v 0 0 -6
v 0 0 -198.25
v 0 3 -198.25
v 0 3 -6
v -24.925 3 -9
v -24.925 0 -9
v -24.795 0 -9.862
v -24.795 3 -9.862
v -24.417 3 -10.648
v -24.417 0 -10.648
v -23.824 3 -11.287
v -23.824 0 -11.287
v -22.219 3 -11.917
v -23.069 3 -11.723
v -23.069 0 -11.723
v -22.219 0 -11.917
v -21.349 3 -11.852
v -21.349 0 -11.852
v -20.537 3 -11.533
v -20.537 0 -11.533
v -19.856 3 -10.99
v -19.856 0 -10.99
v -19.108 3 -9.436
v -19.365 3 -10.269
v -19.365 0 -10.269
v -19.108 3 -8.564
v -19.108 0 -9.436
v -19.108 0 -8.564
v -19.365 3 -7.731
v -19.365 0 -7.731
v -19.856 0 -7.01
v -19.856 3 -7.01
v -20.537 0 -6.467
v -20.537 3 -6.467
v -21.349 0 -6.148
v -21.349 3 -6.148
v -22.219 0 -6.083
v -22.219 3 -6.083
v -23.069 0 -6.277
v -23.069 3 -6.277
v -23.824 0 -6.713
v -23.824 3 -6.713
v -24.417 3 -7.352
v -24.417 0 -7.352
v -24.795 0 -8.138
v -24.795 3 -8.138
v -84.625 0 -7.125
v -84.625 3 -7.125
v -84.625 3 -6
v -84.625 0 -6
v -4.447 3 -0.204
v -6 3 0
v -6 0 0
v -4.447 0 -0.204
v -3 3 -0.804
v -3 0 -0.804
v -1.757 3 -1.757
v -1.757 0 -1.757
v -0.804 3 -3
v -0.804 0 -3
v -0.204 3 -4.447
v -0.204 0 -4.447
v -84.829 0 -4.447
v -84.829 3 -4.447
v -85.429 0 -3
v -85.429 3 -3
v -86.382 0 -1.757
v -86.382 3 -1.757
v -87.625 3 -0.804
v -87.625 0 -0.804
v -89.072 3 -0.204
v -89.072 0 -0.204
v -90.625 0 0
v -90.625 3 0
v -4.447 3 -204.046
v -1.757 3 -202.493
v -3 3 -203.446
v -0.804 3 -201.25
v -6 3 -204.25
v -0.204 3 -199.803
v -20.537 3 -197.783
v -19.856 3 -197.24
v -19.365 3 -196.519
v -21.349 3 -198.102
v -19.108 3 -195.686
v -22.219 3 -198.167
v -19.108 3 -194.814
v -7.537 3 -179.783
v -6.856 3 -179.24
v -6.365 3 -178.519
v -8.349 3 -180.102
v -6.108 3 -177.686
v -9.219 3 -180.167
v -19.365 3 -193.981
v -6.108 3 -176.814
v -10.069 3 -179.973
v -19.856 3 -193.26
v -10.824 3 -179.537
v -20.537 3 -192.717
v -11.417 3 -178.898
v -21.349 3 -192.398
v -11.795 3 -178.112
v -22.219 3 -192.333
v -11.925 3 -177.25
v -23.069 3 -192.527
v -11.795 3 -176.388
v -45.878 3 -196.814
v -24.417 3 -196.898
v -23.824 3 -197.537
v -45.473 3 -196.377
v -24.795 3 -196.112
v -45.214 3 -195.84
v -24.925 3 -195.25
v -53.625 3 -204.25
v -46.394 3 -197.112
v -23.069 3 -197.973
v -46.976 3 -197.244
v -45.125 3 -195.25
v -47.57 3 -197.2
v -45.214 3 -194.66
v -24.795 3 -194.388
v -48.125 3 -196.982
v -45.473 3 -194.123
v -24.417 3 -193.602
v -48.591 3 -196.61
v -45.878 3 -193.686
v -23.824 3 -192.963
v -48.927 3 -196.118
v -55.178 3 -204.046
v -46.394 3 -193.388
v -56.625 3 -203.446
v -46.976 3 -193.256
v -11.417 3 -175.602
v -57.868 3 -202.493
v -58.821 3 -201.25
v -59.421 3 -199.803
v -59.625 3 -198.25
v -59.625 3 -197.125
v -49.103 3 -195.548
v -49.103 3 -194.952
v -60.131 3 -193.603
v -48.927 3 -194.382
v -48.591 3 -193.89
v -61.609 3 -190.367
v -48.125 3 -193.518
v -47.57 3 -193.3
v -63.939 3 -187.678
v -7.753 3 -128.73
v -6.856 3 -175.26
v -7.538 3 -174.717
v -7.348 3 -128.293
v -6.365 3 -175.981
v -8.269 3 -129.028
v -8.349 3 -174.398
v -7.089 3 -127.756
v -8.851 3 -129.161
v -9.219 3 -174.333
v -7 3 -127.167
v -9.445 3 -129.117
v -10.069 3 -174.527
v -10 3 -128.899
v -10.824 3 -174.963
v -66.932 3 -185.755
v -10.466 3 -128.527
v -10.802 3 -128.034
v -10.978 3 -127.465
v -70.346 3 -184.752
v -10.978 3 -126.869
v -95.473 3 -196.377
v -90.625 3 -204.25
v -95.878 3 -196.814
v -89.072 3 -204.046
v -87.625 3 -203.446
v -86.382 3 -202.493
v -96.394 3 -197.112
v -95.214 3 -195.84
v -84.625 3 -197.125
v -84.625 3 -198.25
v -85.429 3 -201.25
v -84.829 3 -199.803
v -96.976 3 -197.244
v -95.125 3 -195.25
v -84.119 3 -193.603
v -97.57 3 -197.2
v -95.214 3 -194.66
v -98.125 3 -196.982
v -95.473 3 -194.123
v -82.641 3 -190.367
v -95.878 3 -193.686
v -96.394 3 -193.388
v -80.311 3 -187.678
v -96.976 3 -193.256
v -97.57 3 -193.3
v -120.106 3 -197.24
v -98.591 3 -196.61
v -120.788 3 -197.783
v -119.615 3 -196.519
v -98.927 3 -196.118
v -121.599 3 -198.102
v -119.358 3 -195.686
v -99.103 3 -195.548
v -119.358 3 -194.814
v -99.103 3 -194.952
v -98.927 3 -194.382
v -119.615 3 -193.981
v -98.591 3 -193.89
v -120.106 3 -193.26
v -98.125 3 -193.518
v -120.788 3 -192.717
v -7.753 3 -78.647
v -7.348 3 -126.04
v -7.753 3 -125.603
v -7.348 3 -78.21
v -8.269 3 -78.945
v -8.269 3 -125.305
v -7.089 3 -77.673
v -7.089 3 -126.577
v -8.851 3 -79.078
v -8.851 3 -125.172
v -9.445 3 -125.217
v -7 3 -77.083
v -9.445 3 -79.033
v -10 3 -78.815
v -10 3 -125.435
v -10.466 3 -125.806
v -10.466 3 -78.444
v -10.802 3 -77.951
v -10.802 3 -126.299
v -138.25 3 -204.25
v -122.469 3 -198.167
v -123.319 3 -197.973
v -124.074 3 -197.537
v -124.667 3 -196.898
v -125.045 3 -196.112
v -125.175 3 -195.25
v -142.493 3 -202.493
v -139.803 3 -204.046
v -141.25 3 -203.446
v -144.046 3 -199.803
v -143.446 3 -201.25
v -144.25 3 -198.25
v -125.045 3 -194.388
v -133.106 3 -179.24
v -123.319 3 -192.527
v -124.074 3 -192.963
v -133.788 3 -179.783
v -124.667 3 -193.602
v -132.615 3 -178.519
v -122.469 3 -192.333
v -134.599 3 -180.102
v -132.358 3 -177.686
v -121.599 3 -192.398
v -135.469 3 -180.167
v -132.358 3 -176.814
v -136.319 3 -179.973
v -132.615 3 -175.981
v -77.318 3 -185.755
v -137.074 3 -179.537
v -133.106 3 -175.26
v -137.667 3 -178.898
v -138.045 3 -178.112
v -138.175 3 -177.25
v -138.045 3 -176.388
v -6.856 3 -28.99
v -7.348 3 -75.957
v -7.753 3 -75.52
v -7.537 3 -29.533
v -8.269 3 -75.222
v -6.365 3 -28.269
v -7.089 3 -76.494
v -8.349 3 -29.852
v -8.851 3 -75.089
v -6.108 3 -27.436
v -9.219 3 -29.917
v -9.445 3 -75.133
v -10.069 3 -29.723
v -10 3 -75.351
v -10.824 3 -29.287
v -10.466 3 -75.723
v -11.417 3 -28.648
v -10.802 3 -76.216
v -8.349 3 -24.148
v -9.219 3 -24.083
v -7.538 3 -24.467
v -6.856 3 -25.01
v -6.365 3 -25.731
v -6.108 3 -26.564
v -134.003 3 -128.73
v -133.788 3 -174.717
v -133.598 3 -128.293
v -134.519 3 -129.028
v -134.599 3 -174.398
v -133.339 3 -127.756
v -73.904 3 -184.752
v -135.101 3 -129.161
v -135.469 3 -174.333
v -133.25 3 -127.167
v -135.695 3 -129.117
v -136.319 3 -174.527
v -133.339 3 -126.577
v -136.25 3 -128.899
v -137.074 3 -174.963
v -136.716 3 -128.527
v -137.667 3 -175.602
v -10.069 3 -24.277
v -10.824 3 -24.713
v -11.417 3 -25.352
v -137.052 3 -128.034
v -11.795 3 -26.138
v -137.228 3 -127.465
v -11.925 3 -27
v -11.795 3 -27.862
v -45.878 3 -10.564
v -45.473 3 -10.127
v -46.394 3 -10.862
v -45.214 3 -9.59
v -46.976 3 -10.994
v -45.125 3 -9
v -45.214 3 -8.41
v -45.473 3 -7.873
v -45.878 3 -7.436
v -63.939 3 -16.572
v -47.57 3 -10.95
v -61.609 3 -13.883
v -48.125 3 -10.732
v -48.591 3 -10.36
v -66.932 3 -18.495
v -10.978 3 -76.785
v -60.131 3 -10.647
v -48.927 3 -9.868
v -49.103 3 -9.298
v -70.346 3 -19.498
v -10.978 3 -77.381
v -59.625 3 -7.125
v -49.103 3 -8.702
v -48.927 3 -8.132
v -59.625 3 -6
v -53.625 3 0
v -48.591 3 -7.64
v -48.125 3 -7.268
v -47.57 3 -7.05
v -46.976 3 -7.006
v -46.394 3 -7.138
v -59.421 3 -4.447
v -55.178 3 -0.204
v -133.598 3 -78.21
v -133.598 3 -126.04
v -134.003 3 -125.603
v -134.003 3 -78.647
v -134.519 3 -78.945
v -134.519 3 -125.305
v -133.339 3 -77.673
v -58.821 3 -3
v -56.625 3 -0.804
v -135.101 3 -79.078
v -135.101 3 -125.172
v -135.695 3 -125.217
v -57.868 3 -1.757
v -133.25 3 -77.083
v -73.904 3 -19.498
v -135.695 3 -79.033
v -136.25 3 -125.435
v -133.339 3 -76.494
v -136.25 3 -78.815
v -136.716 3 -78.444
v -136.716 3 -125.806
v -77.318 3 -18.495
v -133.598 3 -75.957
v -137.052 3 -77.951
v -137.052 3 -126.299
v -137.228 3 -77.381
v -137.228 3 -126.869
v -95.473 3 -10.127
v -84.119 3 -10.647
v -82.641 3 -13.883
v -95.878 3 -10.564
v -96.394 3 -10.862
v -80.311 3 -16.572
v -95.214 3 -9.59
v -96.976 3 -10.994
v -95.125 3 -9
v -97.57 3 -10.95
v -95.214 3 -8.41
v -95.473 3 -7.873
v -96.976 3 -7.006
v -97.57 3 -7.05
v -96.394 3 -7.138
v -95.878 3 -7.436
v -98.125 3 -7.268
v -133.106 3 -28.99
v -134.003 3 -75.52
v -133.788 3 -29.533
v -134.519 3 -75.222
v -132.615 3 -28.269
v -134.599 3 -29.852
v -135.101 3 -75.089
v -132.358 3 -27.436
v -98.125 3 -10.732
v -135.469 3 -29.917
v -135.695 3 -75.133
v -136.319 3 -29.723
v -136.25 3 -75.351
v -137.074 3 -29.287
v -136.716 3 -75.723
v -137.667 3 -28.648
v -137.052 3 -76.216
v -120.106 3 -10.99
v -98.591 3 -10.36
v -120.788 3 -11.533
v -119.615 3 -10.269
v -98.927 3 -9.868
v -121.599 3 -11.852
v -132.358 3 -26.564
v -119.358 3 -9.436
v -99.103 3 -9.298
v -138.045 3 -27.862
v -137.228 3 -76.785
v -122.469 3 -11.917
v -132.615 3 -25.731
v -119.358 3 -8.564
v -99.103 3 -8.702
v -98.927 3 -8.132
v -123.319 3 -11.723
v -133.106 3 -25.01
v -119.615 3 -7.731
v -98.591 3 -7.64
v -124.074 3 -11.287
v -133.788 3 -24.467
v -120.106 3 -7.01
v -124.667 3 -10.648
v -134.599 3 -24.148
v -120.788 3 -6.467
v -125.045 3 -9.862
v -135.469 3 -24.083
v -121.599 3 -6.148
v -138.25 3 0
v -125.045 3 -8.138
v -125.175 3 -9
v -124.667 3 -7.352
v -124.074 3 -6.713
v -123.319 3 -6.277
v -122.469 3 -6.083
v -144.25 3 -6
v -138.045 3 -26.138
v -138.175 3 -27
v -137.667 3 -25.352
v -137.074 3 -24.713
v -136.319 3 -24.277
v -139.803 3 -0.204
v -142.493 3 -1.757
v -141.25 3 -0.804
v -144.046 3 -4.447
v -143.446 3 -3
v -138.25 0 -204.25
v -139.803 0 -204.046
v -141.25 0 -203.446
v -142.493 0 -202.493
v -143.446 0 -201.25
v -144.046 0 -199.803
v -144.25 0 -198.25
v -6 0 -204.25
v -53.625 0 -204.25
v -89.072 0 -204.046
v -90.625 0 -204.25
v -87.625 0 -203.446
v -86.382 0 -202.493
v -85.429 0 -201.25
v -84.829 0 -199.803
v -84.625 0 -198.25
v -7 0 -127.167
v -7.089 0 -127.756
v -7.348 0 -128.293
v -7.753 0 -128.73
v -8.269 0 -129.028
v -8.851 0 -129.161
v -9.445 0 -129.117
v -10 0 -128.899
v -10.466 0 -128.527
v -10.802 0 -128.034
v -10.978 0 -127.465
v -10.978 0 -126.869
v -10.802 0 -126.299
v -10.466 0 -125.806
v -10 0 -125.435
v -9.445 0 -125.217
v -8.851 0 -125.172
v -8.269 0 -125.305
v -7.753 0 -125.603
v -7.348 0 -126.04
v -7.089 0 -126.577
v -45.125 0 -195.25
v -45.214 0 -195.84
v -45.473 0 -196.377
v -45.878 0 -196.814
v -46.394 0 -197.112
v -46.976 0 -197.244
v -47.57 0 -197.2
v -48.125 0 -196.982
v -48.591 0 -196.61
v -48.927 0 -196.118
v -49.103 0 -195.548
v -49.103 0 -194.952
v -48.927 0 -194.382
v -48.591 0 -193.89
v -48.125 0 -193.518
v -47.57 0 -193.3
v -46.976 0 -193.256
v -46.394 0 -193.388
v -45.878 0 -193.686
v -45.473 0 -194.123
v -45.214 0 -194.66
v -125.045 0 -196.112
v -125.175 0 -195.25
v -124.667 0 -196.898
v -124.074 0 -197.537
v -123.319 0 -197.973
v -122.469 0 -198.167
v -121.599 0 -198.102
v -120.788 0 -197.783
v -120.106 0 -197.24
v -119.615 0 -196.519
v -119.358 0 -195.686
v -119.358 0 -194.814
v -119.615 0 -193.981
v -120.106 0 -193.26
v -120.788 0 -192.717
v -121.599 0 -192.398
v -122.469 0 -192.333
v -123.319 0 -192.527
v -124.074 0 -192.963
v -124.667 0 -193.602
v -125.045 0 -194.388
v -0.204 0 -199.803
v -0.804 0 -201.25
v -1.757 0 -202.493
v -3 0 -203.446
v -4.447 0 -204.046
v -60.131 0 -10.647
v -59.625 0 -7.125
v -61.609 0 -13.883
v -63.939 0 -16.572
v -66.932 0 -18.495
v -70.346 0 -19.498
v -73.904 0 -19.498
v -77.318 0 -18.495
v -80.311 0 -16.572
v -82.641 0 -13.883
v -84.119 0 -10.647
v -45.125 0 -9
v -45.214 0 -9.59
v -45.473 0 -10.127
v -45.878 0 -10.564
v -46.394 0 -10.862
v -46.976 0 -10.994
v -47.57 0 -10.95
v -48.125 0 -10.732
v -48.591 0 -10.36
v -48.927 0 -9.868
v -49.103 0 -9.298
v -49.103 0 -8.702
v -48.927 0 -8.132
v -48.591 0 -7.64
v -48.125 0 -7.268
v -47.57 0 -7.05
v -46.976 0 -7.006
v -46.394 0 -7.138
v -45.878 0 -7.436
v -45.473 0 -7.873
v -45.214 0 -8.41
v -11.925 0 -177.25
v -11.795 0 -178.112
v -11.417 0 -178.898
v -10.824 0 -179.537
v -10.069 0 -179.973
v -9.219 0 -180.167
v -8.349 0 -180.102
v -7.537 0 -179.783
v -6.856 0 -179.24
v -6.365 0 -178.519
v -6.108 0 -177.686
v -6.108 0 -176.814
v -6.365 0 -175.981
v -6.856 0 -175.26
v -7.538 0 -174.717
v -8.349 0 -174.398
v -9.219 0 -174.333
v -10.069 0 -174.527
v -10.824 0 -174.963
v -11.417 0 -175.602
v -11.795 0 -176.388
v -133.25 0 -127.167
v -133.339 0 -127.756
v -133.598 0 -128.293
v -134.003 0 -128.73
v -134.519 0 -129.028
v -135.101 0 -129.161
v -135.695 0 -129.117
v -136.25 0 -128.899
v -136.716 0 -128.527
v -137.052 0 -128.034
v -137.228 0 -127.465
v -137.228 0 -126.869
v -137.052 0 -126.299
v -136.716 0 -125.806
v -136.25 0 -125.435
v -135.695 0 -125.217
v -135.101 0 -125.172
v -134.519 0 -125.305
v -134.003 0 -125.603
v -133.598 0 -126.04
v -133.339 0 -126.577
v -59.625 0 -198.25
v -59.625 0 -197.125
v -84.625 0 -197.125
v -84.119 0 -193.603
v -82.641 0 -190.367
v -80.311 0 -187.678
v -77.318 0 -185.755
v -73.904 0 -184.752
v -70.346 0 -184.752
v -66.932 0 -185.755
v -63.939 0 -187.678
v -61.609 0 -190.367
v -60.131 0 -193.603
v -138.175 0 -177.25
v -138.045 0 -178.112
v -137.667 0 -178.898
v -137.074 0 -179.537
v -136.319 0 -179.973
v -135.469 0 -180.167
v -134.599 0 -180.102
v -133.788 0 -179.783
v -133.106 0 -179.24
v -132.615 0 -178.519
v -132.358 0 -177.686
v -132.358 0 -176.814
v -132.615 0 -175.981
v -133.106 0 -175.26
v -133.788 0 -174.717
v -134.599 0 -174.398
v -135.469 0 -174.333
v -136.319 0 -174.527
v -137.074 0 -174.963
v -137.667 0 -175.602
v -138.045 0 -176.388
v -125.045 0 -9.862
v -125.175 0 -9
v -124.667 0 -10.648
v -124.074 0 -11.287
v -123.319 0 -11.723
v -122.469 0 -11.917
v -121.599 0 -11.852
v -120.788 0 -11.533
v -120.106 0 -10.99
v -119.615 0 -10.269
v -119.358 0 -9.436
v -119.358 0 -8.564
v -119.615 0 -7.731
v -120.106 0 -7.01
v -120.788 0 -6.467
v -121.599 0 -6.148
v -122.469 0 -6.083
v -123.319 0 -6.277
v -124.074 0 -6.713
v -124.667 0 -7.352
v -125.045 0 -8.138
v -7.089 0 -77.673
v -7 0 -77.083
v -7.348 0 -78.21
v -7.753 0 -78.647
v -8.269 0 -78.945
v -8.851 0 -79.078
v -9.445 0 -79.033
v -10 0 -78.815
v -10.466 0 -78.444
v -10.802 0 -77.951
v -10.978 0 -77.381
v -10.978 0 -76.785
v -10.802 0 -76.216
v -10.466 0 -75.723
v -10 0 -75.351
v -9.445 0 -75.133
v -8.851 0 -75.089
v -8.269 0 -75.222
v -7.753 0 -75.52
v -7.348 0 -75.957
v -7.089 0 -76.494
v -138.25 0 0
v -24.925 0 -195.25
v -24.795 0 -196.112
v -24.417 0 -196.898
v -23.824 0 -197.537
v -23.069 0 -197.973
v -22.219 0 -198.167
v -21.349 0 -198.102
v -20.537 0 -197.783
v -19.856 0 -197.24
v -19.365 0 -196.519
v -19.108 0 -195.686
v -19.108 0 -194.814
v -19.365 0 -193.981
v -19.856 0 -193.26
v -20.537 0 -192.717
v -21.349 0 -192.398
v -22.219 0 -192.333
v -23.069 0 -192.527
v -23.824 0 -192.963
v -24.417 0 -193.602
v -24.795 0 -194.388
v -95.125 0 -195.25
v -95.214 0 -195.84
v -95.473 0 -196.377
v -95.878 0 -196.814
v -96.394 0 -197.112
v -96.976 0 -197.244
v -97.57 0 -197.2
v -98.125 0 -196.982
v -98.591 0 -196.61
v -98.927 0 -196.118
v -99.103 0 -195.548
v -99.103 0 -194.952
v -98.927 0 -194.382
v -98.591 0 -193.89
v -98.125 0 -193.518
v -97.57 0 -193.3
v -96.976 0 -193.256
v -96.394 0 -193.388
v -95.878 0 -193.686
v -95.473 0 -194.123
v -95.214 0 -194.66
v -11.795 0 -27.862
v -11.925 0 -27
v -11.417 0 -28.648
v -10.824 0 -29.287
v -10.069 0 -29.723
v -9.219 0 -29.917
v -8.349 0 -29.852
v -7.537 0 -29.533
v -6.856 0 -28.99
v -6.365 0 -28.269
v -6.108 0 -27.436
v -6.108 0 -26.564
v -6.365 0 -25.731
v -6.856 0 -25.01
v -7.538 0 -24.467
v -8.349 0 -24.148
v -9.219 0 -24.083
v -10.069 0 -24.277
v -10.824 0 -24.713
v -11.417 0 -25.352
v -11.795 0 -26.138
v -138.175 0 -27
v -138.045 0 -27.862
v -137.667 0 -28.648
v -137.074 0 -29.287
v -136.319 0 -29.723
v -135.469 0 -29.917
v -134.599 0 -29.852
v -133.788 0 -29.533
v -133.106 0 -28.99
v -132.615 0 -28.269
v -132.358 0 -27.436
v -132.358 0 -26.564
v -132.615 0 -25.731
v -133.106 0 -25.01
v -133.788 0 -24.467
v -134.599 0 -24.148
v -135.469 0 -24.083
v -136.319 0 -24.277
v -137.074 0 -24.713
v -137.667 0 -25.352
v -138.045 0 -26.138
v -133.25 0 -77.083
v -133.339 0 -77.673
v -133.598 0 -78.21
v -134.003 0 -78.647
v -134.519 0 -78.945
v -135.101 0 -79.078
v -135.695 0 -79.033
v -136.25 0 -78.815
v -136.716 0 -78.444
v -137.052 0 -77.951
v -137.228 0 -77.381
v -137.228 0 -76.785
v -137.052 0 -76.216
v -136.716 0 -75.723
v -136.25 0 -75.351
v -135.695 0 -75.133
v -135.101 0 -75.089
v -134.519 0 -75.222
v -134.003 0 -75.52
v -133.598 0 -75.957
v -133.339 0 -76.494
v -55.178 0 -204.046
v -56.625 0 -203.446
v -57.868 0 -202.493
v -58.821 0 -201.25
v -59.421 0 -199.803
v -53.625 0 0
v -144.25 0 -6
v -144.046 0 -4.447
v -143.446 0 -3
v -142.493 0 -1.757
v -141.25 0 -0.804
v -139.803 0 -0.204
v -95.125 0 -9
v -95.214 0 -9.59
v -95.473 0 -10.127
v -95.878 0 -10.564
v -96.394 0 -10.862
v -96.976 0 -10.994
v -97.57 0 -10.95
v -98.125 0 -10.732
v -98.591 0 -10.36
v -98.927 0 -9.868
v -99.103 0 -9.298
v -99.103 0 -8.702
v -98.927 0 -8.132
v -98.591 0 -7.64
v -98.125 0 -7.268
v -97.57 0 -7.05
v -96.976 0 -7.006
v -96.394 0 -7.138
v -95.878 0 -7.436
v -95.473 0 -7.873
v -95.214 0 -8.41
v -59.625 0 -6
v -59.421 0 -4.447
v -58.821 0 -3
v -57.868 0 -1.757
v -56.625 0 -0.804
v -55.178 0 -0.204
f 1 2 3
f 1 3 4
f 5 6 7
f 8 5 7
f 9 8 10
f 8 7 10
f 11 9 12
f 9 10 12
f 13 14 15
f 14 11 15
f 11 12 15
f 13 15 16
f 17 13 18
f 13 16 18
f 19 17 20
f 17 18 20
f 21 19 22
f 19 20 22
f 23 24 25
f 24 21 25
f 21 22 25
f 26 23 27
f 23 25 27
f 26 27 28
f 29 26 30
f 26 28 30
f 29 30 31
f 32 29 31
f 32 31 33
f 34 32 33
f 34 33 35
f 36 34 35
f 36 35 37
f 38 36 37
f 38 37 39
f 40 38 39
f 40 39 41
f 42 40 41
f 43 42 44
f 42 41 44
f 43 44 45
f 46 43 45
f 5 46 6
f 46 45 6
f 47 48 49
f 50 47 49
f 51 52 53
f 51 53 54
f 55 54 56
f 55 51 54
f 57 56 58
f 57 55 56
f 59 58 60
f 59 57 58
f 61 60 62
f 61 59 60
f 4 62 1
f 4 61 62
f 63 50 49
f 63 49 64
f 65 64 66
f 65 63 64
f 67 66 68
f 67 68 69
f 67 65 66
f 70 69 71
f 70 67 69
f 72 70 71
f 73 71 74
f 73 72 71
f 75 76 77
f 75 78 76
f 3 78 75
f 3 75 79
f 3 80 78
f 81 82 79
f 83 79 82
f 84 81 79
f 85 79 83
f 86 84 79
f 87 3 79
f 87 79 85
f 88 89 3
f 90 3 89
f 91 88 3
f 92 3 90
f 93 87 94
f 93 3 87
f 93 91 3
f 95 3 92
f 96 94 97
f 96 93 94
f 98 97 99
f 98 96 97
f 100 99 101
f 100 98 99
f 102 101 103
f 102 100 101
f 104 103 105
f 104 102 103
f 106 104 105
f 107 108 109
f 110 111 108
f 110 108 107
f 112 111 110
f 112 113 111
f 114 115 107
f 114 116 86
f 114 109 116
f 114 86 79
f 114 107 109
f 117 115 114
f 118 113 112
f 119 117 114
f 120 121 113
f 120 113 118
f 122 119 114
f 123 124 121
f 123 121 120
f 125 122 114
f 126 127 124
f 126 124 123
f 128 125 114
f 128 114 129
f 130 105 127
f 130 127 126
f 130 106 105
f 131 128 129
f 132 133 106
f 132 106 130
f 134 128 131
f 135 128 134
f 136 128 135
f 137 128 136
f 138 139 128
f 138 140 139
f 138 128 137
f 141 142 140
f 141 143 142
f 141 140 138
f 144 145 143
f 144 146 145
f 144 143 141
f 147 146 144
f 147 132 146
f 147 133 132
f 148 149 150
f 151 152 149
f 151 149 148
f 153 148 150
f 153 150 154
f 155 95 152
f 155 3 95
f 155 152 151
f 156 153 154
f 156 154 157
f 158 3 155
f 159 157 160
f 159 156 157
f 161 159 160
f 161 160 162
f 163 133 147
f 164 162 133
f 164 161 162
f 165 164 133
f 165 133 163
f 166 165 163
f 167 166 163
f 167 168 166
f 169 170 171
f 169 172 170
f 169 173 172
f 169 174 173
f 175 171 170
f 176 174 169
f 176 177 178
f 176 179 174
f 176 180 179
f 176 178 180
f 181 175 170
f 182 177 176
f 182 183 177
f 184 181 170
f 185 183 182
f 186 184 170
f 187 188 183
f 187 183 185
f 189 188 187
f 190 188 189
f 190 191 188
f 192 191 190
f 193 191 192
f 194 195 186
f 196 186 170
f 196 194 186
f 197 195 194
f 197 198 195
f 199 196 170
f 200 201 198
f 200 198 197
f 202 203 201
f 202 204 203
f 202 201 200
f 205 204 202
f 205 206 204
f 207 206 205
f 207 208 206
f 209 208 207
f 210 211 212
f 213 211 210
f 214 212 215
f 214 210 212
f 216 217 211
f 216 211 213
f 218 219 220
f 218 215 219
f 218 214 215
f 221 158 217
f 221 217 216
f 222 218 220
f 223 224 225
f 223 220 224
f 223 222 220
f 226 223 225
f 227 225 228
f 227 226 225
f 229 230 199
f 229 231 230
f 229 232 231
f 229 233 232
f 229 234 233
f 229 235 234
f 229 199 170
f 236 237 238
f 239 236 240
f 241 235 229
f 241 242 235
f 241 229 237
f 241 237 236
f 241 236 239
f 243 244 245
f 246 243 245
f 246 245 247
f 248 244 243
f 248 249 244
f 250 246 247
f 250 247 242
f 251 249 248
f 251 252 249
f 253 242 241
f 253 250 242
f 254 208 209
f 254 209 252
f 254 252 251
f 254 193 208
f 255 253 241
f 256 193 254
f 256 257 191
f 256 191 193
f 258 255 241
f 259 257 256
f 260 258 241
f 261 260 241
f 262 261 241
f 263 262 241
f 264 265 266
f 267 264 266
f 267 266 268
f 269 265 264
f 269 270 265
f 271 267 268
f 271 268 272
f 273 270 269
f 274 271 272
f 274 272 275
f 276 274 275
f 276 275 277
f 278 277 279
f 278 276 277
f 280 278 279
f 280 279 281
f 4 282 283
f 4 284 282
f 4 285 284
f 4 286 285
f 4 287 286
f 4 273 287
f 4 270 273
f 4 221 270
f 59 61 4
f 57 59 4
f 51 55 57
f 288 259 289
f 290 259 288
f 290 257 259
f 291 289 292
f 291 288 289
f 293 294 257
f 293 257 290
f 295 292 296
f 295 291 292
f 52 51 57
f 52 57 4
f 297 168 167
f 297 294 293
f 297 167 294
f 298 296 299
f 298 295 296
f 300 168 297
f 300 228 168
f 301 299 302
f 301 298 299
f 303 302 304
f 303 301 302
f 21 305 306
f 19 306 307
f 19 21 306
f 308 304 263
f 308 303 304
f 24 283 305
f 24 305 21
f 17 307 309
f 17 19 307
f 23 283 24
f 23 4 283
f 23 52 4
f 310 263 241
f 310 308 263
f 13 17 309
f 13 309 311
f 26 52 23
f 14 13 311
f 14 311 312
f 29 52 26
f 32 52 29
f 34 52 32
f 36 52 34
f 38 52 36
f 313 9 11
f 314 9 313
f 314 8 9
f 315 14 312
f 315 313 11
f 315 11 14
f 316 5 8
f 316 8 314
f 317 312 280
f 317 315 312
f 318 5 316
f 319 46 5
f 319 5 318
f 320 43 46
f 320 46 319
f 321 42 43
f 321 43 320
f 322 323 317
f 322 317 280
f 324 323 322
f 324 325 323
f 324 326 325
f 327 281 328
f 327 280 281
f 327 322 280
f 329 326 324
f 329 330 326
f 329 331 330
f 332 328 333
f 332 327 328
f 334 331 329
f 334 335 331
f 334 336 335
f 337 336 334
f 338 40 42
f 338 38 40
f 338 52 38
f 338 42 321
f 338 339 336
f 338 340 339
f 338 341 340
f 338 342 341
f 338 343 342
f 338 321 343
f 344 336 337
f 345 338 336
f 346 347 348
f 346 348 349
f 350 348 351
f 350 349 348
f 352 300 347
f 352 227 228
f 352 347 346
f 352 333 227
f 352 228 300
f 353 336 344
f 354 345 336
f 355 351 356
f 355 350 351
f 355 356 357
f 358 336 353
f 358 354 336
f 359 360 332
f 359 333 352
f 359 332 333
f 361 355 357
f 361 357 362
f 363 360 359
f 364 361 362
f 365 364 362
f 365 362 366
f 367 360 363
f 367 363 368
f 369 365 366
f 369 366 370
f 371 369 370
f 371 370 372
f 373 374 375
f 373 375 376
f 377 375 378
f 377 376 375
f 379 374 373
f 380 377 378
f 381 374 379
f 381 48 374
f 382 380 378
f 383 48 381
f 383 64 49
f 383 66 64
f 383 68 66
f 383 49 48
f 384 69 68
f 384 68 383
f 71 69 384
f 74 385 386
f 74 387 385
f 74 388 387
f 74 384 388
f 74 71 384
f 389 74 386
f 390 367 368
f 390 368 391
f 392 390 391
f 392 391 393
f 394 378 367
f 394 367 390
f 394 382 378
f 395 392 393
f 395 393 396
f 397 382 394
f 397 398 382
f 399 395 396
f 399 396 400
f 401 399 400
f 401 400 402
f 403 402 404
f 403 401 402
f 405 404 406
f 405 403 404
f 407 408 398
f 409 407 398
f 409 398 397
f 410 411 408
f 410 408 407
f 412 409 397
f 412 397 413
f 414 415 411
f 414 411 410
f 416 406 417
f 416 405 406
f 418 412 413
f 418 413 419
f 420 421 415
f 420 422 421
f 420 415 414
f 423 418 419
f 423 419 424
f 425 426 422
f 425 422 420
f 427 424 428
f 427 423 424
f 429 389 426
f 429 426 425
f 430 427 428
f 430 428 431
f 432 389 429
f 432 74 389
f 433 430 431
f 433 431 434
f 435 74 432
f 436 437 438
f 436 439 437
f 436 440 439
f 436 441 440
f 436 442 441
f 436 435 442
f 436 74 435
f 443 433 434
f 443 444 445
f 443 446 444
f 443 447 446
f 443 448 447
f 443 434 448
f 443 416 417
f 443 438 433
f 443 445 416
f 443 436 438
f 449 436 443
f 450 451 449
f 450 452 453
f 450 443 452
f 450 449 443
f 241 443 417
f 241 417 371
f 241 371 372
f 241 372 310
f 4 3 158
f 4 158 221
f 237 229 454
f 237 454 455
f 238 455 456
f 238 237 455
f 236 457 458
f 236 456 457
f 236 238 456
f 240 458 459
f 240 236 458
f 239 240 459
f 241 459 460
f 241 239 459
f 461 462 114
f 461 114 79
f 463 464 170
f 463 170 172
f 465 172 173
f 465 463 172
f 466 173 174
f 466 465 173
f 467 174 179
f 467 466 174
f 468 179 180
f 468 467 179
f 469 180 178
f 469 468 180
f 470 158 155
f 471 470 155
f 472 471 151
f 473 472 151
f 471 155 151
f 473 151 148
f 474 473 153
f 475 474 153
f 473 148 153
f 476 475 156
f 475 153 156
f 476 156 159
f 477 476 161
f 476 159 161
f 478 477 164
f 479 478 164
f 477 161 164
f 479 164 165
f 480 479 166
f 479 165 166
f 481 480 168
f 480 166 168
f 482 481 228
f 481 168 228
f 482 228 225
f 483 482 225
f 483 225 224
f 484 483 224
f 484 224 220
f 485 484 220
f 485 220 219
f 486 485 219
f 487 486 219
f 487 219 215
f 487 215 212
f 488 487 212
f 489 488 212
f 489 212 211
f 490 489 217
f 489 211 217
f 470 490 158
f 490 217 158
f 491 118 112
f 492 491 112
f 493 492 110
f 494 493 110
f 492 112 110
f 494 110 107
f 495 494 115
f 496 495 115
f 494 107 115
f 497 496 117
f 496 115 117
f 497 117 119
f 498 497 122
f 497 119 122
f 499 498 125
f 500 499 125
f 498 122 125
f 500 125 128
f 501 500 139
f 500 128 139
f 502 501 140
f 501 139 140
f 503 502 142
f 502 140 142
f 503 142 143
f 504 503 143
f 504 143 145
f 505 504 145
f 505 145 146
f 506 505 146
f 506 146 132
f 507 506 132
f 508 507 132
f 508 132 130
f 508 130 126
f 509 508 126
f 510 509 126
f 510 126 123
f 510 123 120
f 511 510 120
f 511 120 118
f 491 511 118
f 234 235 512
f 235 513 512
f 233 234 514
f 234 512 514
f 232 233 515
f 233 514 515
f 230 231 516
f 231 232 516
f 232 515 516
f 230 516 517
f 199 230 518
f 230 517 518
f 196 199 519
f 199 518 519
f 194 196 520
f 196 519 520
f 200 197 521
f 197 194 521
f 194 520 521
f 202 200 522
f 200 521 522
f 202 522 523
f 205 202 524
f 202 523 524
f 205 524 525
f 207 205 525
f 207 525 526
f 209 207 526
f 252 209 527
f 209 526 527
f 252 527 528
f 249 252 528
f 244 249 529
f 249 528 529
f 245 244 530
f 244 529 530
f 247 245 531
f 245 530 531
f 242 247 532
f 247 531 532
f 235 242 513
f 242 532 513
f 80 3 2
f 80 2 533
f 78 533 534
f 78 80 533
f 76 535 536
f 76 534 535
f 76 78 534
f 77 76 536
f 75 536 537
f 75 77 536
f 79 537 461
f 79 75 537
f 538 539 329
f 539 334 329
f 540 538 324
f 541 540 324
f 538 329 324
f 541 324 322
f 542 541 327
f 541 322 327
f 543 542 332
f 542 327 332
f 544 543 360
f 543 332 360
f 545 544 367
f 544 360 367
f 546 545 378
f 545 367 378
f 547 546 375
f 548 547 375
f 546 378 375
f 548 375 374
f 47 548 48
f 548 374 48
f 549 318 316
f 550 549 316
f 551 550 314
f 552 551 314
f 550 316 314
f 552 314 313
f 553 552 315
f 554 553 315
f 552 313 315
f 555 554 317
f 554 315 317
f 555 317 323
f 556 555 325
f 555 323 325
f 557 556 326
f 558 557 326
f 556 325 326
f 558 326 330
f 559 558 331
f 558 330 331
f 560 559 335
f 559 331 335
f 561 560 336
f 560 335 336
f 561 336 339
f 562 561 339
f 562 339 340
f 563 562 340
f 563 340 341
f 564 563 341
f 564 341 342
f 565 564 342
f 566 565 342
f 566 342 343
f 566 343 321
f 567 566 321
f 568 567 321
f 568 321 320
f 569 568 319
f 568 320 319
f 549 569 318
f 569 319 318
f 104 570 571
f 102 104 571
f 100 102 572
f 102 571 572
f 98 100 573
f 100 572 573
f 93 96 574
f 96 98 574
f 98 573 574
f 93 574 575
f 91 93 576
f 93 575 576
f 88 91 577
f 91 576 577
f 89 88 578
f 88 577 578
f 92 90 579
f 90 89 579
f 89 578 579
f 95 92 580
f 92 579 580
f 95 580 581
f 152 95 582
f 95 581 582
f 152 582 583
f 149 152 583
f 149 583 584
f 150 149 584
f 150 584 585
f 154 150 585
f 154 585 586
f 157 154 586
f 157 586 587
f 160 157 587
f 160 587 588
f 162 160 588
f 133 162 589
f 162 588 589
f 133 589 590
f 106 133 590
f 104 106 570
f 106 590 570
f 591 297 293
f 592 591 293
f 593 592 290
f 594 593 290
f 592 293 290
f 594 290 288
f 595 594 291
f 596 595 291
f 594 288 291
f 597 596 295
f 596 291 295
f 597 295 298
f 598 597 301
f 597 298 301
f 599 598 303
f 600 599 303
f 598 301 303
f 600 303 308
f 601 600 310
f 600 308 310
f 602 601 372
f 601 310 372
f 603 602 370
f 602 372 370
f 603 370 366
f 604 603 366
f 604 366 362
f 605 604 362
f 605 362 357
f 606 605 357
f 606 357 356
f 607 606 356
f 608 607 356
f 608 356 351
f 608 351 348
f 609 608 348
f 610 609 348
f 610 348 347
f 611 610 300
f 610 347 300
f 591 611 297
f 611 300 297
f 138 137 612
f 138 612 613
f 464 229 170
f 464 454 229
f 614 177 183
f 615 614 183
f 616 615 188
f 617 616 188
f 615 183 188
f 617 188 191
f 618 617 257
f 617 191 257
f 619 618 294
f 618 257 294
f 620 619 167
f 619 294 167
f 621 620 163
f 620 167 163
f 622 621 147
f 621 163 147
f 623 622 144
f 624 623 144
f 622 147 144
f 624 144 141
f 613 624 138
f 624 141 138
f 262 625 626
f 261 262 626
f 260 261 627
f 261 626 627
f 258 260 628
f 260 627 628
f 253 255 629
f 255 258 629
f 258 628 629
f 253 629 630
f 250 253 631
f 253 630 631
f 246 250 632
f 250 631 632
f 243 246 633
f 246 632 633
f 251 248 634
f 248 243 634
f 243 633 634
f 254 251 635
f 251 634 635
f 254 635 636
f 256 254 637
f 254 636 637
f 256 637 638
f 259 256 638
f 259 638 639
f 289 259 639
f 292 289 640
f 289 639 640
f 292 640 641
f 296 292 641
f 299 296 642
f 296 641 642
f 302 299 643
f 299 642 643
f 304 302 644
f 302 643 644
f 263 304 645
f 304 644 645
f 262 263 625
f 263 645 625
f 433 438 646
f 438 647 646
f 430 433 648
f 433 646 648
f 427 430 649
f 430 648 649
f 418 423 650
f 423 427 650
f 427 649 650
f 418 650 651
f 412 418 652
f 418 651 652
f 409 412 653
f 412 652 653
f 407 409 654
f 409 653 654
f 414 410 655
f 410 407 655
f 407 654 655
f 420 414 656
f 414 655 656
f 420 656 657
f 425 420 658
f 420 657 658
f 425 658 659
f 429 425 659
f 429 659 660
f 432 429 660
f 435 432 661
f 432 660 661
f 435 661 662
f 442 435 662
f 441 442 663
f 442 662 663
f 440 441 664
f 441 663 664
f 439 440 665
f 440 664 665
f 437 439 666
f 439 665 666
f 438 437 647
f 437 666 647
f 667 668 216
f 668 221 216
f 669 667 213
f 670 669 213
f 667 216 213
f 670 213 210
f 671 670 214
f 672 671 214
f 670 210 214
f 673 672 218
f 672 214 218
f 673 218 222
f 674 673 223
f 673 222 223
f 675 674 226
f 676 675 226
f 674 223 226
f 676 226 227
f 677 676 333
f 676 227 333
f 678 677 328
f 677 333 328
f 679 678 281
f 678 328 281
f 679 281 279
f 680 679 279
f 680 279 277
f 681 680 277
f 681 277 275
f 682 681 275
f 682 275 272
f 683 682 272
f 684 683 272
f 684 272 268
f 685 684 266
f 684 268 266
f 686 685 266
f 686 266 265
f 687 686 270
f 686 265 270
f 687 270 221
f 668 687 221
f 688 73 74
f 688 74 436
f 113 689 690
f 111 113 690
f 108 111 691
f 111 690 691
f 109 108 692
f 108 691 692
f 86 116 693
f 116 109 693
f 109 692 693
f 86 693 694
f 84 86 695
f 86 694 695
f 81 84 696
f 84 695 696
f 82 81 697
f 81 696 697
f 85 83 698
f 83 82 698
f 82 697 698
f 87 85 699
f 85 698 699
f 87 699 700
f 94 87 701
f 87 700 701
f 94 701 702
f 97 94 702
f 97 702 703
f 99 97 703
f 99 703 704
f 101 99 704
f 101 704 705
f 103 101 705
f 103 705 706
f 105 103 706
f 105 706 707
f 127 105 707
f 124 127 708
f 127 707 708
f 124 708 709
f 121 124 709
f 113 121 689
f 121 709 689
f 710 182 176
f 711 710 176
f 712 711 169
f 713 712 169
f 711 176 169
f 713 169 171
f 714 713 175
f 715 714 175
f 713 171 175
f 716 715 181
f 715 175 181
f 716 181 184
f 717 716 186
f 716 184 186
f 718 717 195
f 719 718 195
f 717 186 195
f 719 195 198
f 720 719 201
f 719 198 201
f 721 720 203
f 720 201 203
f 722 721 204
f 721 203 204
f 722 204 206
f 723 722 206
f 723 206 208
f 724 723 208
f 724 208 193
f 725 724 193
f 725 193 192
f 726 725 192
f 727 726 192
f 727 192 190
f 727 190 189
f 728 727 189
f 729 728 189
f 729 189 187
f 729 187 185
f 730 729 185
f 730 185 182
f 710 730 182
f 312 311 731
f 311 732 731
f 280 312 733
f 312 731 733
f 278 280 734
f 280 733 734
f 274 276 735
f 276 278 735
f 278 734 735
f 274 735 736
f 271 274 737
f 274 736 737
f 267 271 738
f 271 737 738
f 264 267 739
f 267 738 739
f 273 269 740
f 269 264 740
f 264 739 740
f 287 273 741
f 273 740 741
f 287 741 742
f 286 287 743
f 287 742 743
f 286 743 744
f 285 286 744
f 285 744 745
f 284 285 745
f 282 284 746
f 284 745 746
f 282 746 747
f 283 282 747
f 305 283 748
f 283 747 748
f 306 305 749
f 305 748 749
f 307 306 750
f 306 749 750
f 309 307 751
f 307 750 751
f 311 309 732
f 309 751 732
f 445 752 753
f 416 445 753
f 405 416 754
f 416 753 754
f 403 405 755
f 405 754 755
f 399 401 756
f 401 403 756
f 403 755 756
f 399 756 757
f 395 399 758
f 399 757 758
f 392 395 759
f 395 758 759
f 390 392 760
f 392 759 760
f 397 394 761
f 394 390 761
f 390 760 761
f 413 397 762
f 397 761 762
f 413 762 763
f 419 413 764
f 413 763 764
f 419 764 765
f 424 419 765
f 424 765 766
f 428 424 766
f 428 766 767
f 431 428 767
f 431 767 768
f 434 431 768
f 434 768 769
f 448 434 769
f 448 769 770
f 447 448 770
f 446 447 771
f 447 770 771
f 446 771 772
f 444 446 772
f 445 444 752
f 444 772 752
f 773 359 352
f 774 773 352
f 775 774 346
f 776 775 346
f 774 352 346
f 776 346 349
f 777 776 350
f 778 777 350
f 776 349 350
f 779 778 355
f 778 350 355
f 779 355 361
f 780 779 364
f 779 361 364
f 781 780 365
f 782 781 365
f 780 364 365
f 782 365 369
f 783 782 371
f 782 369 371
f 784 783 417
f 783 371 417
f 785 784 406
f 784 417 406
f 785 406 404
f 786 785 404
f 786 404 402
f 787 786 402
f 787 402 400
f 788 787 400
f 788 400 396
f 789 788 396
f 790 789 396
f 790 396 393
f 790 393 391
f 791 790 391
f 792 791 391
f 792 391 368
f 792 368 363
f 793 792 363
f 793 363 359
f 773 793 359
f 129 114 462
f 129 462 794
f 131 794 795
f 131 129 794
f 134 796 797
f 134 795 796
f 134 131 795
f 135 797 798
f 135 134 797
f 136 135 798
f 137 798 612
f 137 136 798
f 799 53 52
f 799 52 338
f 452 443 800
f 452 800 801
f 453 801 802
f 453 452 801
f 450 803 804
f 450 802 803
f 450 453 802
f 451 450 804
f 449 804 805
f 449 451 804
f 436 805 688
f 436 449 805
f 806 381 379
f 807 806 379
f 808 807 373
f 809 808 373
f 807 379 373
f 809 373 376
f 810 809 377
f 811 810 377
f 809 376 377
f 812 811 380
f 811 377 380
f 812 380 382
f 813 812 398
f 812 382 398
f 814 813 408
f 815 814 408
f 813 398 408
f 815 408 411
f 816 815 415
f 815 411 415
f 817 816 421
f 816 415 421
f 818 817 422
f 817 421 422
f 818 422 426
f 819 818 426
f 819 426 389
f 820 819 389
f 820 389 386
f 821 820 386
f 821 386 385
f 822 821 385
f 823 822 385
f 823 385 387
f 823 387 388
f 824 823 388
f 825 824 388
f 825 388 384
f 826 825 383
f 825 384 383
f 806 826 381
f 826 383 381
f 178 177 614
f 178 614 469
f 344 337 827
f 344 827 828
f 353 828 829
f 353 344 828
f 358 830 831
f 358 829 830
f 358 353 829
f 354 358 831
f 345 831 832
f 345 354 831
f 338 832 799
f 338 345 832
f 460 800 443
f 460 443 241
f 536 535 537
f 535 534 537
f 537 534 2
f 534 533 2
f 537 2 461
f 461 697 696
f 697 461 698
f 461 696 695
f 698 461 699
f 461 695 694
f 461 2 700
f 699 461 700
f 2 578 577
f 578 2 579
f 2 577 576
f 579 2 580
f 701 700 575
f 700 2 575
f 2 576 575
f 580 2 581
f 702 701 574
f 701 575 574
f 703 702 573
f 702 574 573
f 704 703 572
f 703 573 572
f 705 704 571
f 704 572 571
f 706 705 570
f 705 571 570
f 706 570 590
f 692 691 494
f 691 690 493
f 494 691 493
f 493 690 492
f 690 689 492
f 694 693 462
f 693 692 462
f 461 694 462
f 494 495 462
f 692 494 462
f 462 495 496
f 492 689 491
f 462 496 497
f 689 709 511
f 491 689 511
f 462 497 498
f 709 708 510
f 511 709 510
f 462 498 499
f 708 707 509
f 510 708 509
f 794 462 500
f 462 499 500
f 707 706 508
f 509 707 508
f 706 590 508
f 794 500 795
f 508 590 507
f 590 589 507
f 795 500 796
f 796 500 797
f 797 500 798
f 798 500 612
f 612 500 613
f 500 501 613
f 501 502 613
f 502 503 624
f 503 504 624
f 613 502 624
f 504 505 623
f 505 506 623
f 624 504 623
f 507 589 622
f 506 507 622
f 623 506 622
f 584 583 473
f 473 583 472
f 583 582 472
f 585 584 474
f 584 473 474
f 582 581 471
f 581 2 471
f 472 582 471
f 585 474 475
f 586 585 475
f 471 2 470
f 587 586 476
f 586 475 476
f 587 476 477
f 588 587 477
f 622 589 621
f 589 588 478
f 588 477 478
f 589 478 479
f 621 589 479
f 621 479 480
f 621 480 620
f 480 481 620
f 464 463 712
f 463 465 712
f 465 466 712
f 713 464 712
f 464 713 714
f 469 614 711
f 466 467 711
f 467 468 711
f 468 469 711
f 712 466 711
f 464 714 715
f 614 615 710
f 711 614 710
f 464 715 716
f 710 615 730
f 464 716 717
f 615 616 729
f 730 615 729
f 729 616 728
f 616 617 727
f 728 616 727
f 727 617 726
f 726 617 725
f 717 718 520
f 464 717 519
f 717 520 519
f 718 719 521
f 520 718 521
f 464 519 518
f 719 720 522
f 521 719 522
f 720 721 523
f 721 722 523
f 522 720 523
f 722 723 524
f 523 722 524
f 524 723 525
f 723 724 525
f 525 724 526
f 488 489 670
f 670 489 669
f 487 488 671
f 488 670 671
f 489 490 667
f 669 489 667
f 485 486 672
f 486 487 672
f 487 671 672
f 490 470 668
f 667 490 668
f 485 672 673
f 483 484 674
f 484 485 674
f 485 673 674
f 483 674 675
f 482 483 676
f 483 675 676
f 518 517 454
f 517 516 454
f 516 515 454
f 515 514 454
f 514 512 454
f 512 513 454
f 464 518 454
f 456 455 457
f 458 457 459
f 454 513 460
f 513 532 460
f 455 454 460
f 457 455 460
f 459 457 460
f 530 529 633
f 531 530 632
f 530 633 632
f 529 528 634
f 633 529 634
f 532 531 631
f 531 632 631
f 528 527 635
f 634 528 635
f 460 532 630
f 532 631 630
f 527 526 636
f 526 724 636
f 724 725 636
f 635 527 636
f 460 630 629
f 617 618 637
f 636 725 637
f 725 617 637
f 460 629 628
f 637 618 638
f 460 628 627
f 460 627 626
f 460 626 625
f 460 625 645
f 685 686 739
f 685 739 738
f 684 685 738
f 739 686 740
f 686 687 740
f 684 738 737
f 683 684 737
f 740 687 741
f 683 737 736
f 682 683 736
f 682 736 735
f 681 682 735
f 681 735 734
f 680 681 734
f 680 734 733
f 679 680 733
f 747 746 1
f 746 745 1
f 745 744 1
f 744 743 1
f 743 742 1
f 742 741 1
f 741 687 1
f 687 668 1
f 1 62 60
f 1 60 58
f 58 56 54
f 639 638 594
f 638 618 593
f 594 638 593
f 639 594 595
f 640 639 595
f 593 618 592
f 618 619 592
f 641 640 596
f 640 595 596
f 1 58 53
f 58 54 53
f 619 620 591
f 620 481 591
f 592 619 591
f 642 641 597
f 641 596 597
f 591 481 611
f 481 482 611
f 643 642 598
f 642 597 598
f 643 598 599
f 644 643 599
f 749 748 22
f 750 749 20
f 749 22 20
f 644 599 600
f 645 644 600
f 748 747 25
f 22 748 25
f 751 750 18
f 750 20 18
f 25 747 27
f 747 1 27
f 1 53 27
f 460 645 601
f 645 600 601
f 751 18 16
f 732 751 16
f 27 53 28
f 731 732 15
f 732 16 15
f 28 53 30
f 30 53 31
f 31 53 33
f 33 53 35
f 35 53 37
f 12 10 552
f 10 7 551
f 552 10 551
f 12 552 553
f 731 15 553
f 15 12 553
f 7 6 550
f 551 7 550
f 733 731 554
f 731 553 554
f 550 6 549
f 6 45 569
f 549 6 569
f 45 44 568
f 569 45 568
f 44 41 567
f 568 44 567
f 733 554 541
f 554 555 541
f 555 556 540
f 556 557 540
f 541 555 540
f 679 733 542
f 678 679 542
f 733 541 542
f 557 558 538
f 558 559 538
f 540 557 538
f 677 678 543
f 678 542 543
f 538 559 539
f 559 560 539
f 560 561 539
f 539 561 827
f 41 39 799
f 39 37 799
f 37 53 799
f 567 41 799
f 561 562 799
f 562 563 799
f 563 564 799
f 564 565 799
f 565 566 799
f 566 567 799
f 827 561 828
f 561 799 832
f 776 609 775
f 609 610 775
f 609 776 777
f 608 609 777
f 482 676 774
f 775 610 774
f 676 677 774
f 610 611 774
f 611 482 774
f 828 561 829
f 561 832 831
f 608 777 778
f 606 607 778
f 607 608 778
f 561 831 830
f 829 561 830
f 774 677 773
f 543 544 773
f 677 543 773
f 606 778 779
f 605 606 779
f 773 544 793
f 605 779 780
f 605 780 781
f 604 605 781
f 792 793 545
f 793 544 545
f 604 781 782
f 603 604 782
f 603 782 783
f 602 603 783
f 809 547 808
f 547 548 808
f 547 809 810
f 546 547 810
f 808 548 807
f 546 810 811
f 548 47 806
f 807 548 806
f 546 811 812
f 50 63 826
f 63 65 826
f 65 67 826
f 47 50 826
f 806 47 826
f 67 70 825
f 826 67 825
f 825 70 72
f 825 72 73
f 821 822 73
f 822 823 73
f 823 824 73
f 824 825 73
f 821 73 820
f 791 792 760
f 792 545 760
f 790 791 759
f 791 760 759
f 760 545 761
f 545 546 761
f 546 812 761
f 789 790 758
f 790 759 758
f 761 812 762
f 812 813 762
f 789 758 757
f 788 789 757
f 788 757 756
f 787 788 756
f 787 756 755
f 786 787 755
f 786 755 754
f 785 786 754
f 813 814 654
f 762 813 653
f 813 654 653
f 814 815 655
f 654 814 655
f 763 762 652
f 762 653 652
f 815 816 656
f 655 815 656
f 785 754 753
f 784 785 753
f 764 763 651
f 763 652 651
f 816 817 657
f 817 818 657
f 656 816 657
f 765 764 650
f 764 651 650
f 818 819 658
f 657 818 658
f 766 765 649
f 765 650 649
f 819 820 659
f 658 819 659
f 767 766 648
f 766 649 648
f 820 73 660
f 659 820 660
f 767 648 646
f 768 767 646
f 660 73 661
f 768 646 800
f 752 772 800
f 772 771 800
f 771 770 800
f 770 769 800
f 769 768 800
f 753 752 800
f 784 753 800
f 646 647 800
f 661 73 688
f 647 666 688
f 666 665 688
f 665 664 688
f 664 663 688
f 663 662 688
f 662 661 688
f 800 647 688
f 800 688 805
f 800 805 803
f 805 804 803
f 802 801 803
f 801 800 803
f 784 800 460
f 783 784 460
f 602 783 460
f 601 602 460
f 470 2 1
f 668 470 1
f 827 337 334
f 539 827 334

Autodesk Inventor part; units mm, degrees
ref_plane "YZ Plane" through (0, 0, 0) normal (1, 0, 0) x (0, 1, 0)
ref_plane "XZ Plane" through (0, 0, 0) normal (0, 1, 0) x (-1, 0, 0)
ref_plane "XY Plane" through (0, 0, 0) normal (0, 0, 1) x (1, 0, 0)
sketch "Sketch1" plane through (0, 0, 0) normal (0, 1, 0) x (-1, 0, 0)
  line L0 (0, 0) -> (144.25, 0)
  line L1 (144.25, 0) -> (144.25, -204.25)
  line L2 (144.25, -204.25) -> (0, -204.25)
  line L3 (0, -204.25) -> (0, 0)
  line L4 (132.25, -12) -> (12, -12) construction
  line L5 (12, -12) -> (12, -192.25) construction
  line L6 (12, -192.25) -> (132.25, -192.25) construction
  line L7 (132.25, -192.25) -> (132.25, -12) construction
  circle A0 centre (135.25, -27) radius 3 construction
  circle A1 centre (122.25, -9) radius 3 construction
  circle A2 centre (122.25, -9) radius 2.925
  circle A3 centre (135.25, -27) radius 2.925
  circle A4 centre (135.25, -177.25) radius 3 construction
  circle A5 centre (122.25, -195.25) radius 3 construction
  circle A6 centre (22, -195.25) radius 3 construction
  circle A7 centre (9, -177.25) radius 3 construction
  circle A8 centre (22, -195.25) radius 2.925
  circle A9 centre (9, -177.25) radius 2.925
  circle A10 centre (135.25, -177.25) radius 2.925
  circle A11 centre (122.25, -195.25) radius 2.925
  circle A12 centre (22, -9) radius 3 construction
  circle A13 centre (9, -27) radius 3 construction
  circle A14 centre (22, -9) radius 2.925
  circle A15 centre (9, -27) radius 2.925
  point P0 (144.25, -102.125)
  point P1 (132.25, -102.125)
  point P2 (72.125, -12)
  point P3 (72.125, 0)
  dimension "width" = 204.25
  dimension "height" = 144.25
  dimension "stencilW" = 180.25
  dimension "stencilH" = 120.25
  dimension "d14" = 6
  dimension "d15" = 6
  dimension "kerf" = 0.075
  dimension "d17" = 0.075
  dimension "cornerW" = 15
  dimension "cornerH" = 10
  dimension "d20" = 6
  dimension "d21" = 6
  dimension "d22" = 6
  dimension "d23" = 6
  dimension "d24" = 10
  dimension "d25" = 15
  dimension "d26" = 10
  dimension "d27" = 15
  dimension "d28" = 0.075
  dimension "d29" = 0.075
  dimension "d30" = 0.075
  dimension "d31" = 0.075
  dimension "d32" = 6
  dimension "d33" = 6
  dimension "d34" = 15
  dimension "d35" = 10
  dimension "d36" = 0.075
  dimension "d37" = 0.075
extrude "Extrusion1" add sketch "Sketch1" along normal blind 3
fillet "Fillet1" radius 6 4 edges at (0, 1.5, 0) (-144.25, 1.5, 0) (0, 1.5, -204.25) (-144.25, 1.5, -204.25)
sketch "Sketch2" plane through (0, 3, 0) normal (0, 1, 0) x (1, 0, 0)
  line L0 (-72.125, -7.125) -> (-72.125, 7.125) construction
  line L1 (-6, 0) -> (-138.25, 0) projected
  line L2 (-59.625, -7.125) -> (-59.625, 7.125)
  line L3 (-84.625, 7.125) -> (-84.625, -7.125)
  arc A0 (-84.625, -7.125) -> (-59.625, -7.125) centre (-72.125, -7.125) ccw
  arc A1 (-59.625, 7.125) -> (-84.625, 7.125) centre (-72.125, 7.125) ccw
  line L4 (-72.125, 0) -> (-57.875, 0) construction
  line L5 (-144.25, 198.25) -> (-144.25, 6) construction
  line L6 (-144.25, 102.125) -> (0, 102.125) construction
  line L7 (0, 6) -> (0, 198.25) construction
  line L8 (-72.125, 211.375) -> (-72.125, 197.125) construction
  line L9 (-59.625, 211.375) -> (-59.625, 197.125)
  line L10 (-84.625, 197.125) -> (-84.625, 211.375)
  arc A2 (-59.625, 211.375) -> (-84.625, 211.375) centre (-72.125, 211.375) ccw
  arc A3 (-84.625, 197.125) -> (-59.625, 197.125) centre (-72.125, 197.125) ccw
  line L11 (-100.1727, 19.625) -> (-55, 19.625) construction
  line L12 (-92.5099, 184.625) -> (-51.3219, 184.625) construction
  point P0 (0, 0)
  dimension "d42" = 90
  dimension "fingerW" = 25
  dimension "d47" = 165
extrude "Extrusion2" cut sketch "Sketch2" against normal blind 3
fillet "Fillet2" radius 6 4 edges at (-84.625, 1.5, 0) (-59.625, 1.5, 0) (-84.625, 1.5, -204.25) (-59.625, 1.5, -204.25)
sketch "Sketch3" plane through (0, 3, 0) normal (0, 1, 0) x (1, 0, 0)
  arc A0 (-59.625, 7.125) -> (-84.625, 7.125) centre (-72.125, 7.125) ccw construction
  arc A1 (-84.625, 197.125) -> (-59.625, 197.125) centre (-72.125, 197.125) ccw construction
  line L0 (-144.25, 198.25) -> (-144.25, 6) construction
  line L1 (0, 6) -> (0, 198.25) construction
  arc A2 (-59.625, 7.125) -> (-84.625, 7.125) centre (-72.125, 7.125) ccw construction
  line L2 (-72.125, 19.625) -> (-72.125, 184.625)
  line L3 (-144.25, 102.125) -> (0, 102.125)
  point P0 (0, 0)
sketch "Sketch4" plane through (0, 3, 0) normal (0, 1, 0) x (1, 0, 0)
  circle A0 centre (-135.25, 77.0833) radius 2
  circle A1 centre (-135.25, 127.1667) radius 2
  arc A2 (-53.625, 204.25) -> (-59.625, 198.25) centre (-53.625, 198.25) ccw construction
  line L0 (-59.625, 198.25) -> (-59.625, 197.125) construction
  arc A3 (-84.625, 197.125) -> (-59.625, 197.125) centre (-72.125, 197.125) ccw construction
  line L1 (-84.625, 197.125) -> (-84.625, 198.25) construction
  arc A4 (-84.625, 198.25) -> (-90.625, 204.25) centre (-90.625, 198.25) ccw construction
  line L2 (-90.625, 204.25) -> (-138.25, 204.25) construction
  arc A5 (-138.25, 204.25) -> (-144.25, 198.25) centre (-138.25, 198.25) ccw construction
  line L3 (-144.25, 198.25) -> (-144.25, 6) construction
  arc A6 (-144.25, 6) -> (-138.25, 0) centre (-138.25, 6) ccw construction
  line L4 (-138.25, 0) -> (-90.625, 0) construction
  arc A7 (-90.625, 0) -> (-84.625, 6) centre (-90.625, 6) ccw construction
  line L5 (-84.625, 6) -> (-84.625, 7.125) construction
  arc A8 (-59.625, 7.125) -> (-84.625, 7.125) centre (-72.125, 7.125) ccw construction
  line L6 (-59.625, 7.125) -> (-59.625, 6) construction
  arc A9 (-59.625, 6) -> (-53.625, 0) centre (-53.625, 6) ccw construction
  line L7 (-53.625, 0) -> (-6, 0) construction
  arc A10 (-6, 0) -> (0, 6) centre (-6, 6) ccw construction
  line L8 (0, 6) -> (0, 198.25) construction
  arc A11 (0, 198.25) -> (-6, 204.25) centre (-6, 198.25) ccw construction
  line L9 (-6, 204.25) -> (-53.625, 204.25) construction
  circle A12 centre (-9, 27) radius 2.925 construction
  circle A13 centre (-22, 9) radius 2.925 construction
  circle A14 centre (-122.25, 195.25) radius 2.925 construction
  circle A15 centre (-135.25, 177.25) radius 2.925 construction
  circle A16 centre (-9, 177.25) radius 2.925 construction
  circle A17 centre (-22, 195.25) radius 2.925 construction
  circle A18 centre (-135.25, 27) radius 2.925 construction
  circle A19 centre (-122.25, 9) radius 2.925 construction
  circle A20 centre (-9, 77.0833) radius 2
  circle A21 centre (-9, 127.1667) radius 2
  circle A22 centre (-97.125, 9) radius 2
  circle A23 centre (-47.125, 9) radius 2
  circle A24 centre (-47.125, 195.25) radius 2
  circle A25 centre (-97.125, 195.25) radius 2
  point P0 (0, 0)
  dimension "d48" = 4
  dimension "d49" = 4
  dimension "d50" = 50.0833
  dimension "d51" = 50.0833
  dimension "d52" = 50.0833
  dimension "d53" = 4
  dimension "d54" = 4
  dimension "d55" = 4
  dimension "d56" = 4
  dimension "d57" = 4
  dimension "d58" = 4
  dimension "d59" = 50
  dimension "d60" = 25.125
  dimension "d61" = 25.125
extrude "Extrusion3" cut sketch "Sketch4" against normal blind 3
equation "\"width\" = stencilW + 4 * pinD"
equation "\"height\" = stencilH + 4 * pinD"
equation "\"d14\" = pinD"
equation "\"d15\" = pinD"
equation "\"d17\" = kerf"
equation "\"d20\" = pinD"
equation "\"d21\" = pinD"
equation "\"d22\" = pinD"
equation "\"d23\" = pinD"
equation "\"d24\" = cornerH"
equation "\"d25\" = cornerW"
equation "\"d26\" = cornerH"
equation "\"d27\" = cornerW"
equation "\"d28\" = kerf"
equation "\"d29\" = kerf"
equation "\"d30\" = kerf"
equation "\"d31\" = kerf"
equation "\"d32\" = pinD"
equation "\"d33\" = pinD"
equation "\"d34\" = cornerW"
equation "\"d35\" = cornerH"
equation "\"d36\" = kerf"
equation "\"d37\" = kerf"
equation "\"d40\" = pinD"
equation "\"d46\" = pinD"
equation "\"d50\" = d52"
equation "\"d51\" = d50"
equation "\"d60\" = d61"
equation "\"pinD\" = 6"
properties part number "base"
